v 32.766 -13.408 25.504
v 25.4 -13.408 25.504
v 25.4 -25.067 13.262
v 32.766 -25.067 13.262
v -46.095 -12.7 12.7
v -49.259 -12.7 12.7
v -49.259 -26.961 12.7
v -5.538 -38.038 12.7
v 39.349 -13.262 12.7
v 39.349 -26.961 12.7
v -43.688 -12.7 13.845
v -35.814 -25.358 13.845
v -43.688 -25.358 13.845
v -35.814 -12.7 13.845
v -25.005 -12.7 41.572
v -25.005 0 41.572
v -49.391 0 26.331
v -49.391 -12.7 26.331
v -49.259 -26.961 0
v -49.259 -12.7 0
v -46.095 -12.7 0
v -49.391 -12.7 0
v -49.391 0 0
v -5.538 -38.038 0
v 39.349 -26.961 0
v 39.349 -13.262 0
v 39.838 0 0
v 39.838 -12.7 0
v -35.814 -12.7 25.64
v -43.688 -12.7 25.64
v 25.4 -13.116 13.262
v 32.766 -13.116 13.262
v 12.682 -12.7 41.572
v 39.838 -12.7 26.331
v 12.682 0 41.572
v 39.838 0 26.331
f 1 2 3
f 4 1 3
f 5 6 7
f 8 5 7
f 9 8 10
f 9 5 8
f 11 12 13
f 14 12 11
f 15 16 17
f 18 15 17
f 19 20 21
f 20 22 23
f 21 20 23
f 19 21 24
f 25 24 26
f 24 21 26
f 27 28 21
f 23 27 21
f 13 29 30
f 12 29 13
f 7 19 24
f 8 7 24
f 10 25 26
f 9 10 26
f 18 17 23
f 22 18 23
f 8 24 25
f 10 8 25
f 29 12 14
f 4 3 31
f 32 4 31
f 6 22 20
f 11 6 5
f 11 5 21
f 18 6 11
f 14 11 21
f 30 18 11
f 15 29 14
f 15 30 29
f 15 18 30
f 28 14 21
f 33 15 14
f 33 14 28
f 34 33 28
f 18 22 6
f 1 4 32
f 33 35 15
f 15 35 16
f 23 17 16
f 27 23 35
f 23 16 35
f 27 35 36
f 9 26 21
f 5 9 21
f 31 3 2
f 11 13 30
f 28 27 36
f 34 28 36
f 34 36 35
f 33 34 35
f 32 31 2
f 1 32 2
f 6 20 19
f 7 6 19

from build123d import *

# Parameters (mm, degrees)
F1_DEPTH = 12.7
F3_DEPTH = 12.7
F5_DEPTH = 32.766
F6_DEPTH = 25.4
F8_DEPTH = 43.688
F9_DEPTH = 35.814


with BuildPart() as f1:
    # F0 (on Front) → F1 (new body)
    with BuildSketch(Plane.XZ):
        Polygon((12.681666, 41.572303), (-25.005262, 41.572303), (-49.39092, 26.331266), (-49.39092, 0), (39.838422, 0), (39.838422, 26.331266), align=None)
    extrude(amount=F1_DEPTH)

    # F2 (on Top) → F3 (join)
    with BuildSketch(Plane.XY):
        Polygon((39.349183, -13.26213), (-49.259346, -12.67918), (-49.259346, -26.961476), (-5.538032, -38.037542), (39.349183, -26.961476), align=None)
    extrude(amount=F3_DEPTH)

    # F7 (on Right) → F8 (join)
    with BuildSketch(Plane.YZ):
        Polygon((-12.533442, 25.795575), (-25.35836, 13.845082), (-12.533442, 13.845082), align=None)
    extrude(amount=-F8_DEPTH)

    # F8_face (on face) → F9 (cut)
    with BuildSketch(Plane(origin=(0, -16.919453, 17.776846), x_dir=(0, 1, 0), z_dir=(1, 0, 0))):
        Polygon((4.219453, -3.931764), (4.219453, 7.863527), (-8.438907, -3.931764), align=None)
    extrude(amount=-F9_DEPTH, mode=Mode.SUBTRACT)


with BuildPart() as f5:
    # F4 (on Right) → F5 (new body)
    with BuildSketch(Plane.YZ):
        Polygon((-25.066884, 13.26213), (-13.116392, 13.26213), (-13.407867, 25.504097), align=None)
    extrude(amount=F5_DEPTH)

    # F5_face (on face) → F6 (cut)
    with BuildSketch(Plane(origin=(0, -17.197048, 17.342786), x_dir=(0, 1, 0), z_dir=(-1, 0, 0))):
        Polygon((4.080656, 4.080656), (-7.869836, 4.080656), (3.789181, -8.161311), align=None)
    extrude(amount=-F6_DEPTH, mode=Mode.SUBTRACT)


solid = Compound([f1.part, f5.part])
